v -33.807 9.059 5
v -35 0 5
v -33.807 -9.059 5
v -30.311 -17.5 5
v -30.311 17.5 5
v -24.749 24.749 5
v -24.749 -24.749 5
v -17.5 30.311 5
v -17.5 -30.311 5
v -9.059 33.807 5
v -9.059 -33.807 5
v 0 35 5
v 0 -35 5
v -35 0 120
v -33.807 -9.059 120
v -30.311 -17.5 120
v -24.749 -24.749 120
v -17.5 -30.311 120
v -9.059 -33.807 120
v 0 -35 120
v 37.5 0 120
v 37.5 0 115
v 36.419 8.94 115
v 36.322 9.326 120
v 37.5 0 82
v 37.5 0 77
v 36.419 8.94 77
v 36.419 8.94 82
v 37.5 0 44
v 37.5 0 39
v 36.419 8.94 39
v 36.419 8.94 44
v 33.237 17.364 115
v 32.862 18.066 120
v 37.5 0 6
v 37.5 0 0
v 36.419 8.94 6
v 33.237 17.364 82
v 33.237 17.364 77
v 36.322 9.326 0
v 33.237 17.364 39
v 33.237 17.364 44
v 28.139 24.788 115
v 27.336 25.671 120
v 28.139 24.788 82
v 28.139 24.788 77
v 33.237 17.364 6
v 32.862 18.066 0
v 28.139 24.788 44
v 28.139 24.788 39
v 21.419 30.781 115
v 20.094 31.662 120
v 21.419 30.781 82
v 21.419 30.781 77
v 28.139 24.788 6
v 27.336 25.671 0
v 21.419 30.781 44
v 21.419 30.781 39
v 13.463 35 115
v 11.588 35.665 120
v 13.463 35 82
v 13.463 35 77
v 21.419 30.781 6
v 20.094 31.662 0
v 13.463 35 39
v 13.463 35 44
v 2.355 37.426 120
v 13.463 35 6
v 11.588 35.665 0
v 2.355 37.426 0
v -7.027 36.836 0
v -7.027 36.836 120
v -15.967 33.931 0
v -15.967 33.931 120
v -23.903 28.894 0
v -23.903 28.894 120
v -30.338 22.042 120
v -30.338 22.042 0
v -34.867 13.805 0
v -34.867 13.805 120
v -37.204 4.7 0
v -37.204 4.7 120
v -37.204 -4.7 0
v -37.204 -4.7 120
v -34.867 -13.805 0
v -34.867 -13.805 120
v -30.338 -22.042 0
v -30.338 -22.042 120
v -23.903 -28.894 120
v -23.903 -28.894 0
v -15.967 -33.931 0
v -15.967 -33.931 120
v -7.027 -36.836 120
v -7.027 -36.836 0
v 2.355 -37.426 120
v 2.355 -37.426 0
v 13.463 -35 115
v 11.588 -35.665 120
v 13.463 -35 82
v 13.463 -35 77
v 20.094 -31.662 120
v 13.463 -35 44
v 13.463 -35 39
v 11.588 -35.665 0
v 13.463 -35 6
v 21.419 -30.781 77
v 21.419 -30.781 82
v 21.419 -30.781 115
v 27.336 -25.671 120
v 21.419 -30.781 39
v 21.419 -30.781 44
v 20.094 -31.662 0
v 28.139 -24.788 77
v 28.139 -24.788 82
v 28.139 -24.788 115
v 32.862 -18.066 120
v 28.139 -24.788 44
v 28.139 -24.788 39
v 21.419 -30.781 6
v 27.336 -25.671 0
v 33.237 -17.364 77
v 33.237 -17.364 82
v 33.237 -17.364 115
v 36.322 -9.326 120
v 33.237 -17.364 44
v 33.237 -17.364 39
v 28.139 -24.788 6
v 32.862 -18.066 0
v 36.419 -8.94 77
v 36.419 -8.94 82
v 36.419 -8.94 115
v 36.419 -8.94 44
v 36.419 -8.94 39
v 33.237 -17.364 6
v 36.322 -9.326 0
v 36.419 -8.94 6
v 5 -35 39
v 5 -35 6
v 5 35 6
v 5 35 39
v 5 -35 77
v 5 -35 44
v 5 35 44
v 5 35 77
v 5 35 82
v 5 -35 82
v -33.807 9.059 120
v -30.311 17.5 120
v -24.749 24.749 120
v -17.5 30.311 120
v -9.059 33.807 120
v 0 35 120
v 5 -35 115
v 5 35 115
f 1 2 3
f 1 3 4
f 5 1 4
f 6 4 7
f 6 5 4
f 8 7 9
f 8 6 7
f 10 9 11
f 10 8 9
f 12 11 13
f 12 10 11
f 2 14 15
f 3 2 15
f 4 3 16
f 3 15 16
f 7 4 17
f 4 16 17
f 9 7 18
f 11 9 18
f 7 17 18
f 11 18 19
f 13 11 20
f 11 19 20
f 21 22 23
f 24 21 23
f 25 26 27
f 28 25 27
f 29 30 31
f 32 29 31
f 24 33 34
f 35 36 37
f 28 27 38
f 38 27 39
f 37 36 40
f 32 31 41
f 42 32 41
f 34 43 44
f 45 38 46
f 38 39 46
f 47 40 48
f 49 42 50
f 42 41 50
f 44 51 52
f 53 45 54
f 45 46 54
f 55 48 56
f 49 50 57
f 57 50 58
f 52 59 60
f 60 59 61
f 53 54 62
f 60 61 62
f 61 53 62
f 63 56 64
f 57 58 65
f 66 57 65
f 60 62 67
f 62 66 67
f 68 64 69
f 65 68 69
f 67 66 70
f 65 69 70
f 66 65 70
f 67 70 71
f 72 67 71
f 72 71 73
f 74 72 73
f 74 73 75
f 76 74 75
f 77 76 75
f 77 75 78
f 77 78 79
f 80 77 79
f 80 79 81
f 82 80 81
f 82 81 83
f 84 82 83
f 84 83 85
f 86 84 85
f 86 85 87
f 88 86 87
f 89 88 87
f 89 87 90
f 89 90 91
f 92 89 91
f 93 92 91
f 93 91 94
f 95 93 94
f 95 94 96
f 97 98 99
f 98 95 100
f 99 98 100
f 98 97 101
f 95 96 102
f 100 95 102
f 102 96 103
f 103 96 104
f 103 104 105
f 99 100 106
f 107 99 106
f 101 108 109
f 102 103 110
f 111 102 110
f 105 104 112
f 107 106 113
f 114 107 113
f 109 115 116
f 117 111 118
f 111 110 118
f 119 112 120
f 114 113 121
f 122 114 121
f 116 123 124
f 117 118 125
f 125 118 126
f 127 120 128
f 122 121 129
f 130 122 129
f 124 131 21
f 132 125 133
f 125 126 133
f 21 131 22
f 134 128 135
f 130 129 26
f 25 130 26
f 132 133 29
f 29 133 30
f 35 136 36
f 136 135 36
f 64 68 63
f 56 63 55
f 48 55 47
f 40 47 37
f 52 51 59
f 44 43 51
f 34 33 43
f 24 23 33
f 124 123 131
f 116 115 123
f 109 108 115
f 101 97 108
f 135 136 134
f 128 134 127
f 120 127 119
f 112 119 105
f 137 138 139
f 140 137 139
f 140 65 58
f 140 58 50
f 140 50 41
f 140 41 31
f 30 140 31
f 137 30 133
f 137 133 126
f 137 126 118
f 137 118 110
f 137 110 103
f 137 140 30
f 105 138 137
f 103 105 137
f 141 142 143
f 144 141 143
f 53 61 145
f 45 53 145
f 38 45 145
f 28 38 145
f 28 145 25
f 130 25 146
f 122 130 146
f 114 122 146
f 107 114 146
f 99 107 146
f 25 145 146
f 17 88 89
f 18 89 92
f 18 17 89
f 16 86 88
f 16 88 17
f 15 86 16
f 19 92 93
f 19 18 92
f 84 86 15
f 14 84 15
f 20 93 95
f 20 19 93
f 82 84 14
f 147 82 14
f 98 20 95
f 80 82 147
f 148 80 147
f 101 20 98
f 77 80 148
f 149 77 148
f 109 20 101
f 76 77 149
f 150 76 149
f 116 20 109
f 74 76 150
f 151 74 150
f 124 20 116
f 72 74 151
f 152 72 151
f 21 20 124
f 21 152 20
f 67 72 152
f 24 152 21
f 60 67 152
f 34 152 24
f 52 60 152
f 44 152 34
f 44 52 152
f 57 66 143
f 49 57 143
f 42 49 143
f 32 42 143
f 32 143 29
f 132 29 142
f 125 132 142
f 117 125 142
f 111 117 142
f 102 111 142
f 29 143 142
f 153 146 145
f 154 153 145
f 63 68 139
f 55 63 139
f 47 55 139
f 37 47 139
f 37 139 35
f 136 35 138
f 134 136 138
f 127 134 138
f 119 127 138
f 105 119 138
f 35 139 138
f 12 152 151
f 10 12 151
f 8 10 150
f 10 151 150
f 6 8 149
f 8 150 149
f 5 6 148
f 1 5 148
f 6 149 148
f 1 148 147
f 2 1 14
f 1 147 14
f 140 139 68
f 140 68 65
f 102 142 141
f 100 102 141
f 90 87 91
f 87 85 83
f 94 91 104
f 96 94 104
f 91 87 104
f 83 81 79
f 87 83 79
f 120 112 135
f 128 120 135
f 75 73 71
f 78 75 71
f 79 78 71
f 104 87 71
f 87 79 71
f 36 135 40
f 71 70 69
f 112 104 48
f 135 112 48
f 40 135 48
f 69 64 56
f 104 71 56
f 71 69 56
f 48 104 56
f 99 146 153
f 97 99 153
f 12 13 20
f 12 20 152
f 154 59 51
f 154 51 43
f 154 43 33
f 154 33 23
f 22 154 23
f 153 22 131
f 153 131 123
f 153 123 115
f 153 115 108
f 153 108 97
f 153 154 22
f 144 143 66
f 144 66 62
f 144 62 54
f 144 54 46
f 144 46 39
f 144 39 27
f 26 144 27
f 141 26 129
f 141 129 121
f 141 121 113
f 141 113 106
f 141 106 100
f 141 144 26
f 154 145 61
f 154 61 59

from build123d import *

# Parameters (mm, degrees)
F0_R     = 37.5
F1_DEPTH = 120
F3_DEPTH = 115
F4_W     = 70
F4_H     = 33
F5_DEPTH = 40
F6_W     = 5
F6_H     = 70
F7_DEPTH = 109


with BuildPart() as f1:
    # F0 (on Top) → F1 (new body)
    with BuildSketch(Plane.XY):
        Circle(F0_R)
    extrude(amount=F1_DEPTH)

    # F2 (on face) → F3 (cut)
    with BuildSketch(Plane.XY.offset(120)):
        with BuildLine():
            Line((0, -35), (0, 35))
            ThreePointArc((0, 35), (-24.748737, 24.748737), (-35, 0))
            ThreePointArc((-35, 0), (-24.748737, -24.748737), (0, -35))
        make_face()
    extrude(amount=-F3_DEPTH, mode=Mode.SUBTRACT)

    # F4 (on face) → F5 (cut)
    with BuildSketch(Plane(origin=(0, 0, 0), x_dir=(0, -1, 0), z_dir=(-1, 0, 0))):
        with Locations((0, 22.5)):
            Rectangle(F4_W, F4_H)
        with Locations((0, 60.5)):
            Rectangle(F4_W, F4_H)
        with Locations((0, 98.5)):
            Rectangle(F4_W, F4_H)
    extrude(amount=-F5_DEPTH, mode=Mode.SUBTRACT)

    # F6 (on face) → F7 (join)
    with BuildSketch(Plane.XY.offset(6)):
        with Locations((2.5, 0)):
            Rectangle(F6_W, F6_H)
    extrude(amount=F7_DEPTH)


solid = f1.part
